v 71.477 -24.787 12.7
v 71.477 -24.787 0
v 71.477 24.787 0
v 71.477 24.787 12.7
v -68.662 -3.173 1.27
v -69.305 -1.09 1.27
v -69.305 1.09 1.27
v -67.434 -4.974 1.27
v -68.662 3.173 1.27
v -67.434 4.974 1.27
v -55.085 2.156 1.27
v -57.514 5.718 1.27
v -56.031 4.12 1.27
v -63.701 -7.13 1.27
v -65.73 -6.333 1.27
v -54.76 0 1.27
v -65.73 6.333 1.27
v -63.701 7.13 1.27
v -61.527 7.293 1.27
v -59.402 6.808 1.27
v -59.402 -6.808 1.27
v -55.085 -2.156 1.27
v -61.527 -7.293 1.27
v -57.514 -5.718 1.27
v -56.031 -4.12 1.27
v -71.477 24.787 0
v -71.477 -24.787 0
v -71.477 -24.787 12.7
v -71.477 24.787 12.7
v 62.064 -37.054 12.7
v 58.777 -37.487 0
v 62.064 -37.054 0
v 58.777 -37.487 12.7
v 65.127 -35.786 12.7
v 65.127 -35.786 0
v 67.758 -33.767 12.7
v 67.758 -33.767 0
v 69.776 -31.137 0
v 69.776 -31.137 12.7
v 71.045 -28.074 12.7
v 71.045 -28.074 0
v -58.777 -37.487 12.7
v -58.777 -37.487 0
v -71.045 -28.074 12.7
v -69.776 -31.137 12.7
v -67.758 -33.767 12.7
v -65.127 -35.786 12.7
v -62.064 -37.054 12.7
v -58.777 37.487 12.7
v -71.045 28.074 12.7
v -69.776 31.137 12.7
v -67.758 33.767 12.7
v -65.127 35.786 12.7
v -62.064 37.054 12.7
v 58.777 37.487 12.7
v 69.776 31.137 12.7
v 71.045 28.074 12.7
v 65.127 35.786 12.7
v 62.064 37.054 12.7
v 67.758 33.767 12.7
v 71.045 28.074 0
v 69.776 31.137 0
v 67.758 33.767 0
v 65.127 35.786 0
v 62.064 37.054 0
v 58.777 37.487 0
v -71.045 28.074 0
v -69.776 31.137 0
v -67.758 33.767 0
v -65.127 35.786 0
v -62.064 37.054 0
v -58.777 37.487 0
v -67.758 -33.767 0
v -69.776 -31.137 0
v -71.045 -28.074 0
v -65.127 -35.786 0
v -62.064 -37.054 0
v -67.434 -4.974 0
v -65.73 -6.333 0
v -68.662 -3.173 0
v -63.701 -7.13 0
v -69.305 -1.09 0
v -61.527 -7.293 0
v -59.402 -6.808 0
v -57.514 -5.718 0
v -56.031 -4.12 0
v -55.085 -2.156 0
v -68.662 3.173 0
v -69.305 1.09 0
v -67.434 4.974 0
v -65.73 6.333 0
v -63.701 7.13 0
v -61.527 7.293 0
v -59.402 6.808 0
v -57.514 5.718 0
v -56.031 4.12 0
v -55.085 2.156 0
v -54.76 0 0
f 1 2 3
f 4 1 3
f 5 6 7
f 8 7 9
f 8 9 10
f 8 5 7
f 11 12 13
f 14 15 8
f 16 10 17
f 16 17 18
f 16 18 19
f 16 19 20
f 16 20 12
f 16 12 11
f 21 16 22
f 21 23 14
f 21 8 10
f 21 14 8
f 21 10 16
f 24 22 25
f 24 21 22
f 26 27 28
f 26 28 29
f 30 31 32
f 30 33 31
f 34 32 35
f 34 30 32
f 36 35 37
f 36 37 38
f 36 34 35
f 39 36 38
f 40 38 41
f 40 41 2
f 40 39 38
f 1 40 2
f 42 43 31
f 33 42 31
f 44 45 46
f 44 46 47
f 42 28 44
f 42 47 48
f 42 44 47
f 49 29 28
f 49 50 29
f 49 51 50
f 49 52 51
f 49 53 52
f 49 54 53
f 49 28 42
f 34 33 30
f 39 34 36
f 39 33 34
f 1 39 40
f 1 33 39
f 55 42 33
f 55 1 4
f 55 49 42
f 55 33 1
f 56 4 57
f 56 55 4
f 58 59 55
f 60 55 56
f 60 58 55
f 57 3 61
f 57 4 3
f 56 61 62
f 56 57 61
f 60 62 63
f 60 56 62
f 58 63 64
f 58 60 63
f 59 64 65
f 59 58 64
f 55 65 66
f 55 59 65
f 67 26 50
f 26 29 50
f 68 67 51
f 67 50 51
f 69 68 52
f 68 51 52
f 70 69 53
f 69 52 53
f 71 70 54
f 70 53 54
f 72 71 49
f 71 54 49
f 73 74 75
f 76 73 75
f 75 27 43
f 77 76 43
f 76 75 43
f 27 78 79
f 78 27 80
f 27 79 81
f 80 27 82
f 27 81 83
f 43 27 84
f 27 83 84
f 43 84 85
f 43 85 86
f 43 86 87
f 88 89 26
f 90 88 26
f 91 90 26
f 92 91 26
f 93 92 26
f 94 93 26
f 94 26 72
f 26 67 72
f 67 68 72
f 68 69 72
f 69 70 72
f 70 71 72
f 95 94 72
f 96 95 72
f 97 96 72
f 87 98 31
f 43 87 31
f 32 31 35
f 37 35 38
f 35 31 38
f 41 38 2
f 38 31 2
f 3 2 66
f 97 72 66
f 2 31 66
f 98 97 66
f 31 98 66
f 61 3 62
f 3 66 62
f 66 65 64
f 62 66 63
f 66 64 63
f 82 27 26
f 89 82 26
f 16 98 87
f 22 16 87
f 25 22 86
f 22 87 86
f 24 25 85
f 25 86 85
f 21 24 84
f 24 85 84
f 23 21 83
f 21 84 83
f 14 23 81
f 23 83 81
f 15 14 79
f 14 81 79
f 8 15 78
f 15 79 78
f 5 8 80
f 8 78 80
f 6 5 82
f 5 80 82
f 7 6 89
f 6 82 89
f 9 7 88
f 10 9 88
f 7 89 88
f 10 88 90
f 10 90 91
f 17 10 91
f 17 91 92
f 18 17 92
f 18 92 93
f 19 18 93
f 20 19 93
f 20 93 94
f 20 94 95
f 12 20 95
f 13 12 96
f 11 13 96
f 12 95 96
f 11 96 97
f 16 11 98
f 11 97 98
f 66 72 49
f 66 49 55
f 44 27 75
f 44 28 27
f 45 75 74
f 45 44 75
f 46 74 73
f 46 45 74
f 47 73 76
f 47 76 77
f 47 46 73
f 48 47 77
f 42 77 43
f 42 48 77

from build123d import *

# Parameters (mm, degrees)
F0_W     = 142.95493
F0_H     = 74.974402
F1_DEPTH = 12.7
F2_R     = 12.7
F3_R     = 7.313249
F4_DEPTH = 1.27


with BuildPart() as f1:
    # F0 (on Top) → F1 (new body)
    with BuildSketch(Plane.XY):
        Rectangle(F0_W, F0_H)
    extrude(amount=F1_DEPTH)

    # F2
    f2_edges = [f1.edges().sort_by_distance(p)[0] for p in [
        (71.477465, -37.487201, 6.35),
        (71.477465, 37.487201, 6.35),
        (-71.477465, 37.487201, 6.35),
        (-71.477465, -37.487201, 6.35),
    ]]
    fillet(f2_edges, radius=F2_R)

    # F3 (on face) → F4 (cut)
    with BuildSketch(Plane(origin=(0, 0, 0), x_dir=(1, 0, 0), z_dir=(0, 0, -1))):
        with Locations((-62.073462, 0)):
            Circle(F3_R)
    extrude(amount=-F4_DEPTH, mode=Mode.SUBTRACT)


solid = f1.part
